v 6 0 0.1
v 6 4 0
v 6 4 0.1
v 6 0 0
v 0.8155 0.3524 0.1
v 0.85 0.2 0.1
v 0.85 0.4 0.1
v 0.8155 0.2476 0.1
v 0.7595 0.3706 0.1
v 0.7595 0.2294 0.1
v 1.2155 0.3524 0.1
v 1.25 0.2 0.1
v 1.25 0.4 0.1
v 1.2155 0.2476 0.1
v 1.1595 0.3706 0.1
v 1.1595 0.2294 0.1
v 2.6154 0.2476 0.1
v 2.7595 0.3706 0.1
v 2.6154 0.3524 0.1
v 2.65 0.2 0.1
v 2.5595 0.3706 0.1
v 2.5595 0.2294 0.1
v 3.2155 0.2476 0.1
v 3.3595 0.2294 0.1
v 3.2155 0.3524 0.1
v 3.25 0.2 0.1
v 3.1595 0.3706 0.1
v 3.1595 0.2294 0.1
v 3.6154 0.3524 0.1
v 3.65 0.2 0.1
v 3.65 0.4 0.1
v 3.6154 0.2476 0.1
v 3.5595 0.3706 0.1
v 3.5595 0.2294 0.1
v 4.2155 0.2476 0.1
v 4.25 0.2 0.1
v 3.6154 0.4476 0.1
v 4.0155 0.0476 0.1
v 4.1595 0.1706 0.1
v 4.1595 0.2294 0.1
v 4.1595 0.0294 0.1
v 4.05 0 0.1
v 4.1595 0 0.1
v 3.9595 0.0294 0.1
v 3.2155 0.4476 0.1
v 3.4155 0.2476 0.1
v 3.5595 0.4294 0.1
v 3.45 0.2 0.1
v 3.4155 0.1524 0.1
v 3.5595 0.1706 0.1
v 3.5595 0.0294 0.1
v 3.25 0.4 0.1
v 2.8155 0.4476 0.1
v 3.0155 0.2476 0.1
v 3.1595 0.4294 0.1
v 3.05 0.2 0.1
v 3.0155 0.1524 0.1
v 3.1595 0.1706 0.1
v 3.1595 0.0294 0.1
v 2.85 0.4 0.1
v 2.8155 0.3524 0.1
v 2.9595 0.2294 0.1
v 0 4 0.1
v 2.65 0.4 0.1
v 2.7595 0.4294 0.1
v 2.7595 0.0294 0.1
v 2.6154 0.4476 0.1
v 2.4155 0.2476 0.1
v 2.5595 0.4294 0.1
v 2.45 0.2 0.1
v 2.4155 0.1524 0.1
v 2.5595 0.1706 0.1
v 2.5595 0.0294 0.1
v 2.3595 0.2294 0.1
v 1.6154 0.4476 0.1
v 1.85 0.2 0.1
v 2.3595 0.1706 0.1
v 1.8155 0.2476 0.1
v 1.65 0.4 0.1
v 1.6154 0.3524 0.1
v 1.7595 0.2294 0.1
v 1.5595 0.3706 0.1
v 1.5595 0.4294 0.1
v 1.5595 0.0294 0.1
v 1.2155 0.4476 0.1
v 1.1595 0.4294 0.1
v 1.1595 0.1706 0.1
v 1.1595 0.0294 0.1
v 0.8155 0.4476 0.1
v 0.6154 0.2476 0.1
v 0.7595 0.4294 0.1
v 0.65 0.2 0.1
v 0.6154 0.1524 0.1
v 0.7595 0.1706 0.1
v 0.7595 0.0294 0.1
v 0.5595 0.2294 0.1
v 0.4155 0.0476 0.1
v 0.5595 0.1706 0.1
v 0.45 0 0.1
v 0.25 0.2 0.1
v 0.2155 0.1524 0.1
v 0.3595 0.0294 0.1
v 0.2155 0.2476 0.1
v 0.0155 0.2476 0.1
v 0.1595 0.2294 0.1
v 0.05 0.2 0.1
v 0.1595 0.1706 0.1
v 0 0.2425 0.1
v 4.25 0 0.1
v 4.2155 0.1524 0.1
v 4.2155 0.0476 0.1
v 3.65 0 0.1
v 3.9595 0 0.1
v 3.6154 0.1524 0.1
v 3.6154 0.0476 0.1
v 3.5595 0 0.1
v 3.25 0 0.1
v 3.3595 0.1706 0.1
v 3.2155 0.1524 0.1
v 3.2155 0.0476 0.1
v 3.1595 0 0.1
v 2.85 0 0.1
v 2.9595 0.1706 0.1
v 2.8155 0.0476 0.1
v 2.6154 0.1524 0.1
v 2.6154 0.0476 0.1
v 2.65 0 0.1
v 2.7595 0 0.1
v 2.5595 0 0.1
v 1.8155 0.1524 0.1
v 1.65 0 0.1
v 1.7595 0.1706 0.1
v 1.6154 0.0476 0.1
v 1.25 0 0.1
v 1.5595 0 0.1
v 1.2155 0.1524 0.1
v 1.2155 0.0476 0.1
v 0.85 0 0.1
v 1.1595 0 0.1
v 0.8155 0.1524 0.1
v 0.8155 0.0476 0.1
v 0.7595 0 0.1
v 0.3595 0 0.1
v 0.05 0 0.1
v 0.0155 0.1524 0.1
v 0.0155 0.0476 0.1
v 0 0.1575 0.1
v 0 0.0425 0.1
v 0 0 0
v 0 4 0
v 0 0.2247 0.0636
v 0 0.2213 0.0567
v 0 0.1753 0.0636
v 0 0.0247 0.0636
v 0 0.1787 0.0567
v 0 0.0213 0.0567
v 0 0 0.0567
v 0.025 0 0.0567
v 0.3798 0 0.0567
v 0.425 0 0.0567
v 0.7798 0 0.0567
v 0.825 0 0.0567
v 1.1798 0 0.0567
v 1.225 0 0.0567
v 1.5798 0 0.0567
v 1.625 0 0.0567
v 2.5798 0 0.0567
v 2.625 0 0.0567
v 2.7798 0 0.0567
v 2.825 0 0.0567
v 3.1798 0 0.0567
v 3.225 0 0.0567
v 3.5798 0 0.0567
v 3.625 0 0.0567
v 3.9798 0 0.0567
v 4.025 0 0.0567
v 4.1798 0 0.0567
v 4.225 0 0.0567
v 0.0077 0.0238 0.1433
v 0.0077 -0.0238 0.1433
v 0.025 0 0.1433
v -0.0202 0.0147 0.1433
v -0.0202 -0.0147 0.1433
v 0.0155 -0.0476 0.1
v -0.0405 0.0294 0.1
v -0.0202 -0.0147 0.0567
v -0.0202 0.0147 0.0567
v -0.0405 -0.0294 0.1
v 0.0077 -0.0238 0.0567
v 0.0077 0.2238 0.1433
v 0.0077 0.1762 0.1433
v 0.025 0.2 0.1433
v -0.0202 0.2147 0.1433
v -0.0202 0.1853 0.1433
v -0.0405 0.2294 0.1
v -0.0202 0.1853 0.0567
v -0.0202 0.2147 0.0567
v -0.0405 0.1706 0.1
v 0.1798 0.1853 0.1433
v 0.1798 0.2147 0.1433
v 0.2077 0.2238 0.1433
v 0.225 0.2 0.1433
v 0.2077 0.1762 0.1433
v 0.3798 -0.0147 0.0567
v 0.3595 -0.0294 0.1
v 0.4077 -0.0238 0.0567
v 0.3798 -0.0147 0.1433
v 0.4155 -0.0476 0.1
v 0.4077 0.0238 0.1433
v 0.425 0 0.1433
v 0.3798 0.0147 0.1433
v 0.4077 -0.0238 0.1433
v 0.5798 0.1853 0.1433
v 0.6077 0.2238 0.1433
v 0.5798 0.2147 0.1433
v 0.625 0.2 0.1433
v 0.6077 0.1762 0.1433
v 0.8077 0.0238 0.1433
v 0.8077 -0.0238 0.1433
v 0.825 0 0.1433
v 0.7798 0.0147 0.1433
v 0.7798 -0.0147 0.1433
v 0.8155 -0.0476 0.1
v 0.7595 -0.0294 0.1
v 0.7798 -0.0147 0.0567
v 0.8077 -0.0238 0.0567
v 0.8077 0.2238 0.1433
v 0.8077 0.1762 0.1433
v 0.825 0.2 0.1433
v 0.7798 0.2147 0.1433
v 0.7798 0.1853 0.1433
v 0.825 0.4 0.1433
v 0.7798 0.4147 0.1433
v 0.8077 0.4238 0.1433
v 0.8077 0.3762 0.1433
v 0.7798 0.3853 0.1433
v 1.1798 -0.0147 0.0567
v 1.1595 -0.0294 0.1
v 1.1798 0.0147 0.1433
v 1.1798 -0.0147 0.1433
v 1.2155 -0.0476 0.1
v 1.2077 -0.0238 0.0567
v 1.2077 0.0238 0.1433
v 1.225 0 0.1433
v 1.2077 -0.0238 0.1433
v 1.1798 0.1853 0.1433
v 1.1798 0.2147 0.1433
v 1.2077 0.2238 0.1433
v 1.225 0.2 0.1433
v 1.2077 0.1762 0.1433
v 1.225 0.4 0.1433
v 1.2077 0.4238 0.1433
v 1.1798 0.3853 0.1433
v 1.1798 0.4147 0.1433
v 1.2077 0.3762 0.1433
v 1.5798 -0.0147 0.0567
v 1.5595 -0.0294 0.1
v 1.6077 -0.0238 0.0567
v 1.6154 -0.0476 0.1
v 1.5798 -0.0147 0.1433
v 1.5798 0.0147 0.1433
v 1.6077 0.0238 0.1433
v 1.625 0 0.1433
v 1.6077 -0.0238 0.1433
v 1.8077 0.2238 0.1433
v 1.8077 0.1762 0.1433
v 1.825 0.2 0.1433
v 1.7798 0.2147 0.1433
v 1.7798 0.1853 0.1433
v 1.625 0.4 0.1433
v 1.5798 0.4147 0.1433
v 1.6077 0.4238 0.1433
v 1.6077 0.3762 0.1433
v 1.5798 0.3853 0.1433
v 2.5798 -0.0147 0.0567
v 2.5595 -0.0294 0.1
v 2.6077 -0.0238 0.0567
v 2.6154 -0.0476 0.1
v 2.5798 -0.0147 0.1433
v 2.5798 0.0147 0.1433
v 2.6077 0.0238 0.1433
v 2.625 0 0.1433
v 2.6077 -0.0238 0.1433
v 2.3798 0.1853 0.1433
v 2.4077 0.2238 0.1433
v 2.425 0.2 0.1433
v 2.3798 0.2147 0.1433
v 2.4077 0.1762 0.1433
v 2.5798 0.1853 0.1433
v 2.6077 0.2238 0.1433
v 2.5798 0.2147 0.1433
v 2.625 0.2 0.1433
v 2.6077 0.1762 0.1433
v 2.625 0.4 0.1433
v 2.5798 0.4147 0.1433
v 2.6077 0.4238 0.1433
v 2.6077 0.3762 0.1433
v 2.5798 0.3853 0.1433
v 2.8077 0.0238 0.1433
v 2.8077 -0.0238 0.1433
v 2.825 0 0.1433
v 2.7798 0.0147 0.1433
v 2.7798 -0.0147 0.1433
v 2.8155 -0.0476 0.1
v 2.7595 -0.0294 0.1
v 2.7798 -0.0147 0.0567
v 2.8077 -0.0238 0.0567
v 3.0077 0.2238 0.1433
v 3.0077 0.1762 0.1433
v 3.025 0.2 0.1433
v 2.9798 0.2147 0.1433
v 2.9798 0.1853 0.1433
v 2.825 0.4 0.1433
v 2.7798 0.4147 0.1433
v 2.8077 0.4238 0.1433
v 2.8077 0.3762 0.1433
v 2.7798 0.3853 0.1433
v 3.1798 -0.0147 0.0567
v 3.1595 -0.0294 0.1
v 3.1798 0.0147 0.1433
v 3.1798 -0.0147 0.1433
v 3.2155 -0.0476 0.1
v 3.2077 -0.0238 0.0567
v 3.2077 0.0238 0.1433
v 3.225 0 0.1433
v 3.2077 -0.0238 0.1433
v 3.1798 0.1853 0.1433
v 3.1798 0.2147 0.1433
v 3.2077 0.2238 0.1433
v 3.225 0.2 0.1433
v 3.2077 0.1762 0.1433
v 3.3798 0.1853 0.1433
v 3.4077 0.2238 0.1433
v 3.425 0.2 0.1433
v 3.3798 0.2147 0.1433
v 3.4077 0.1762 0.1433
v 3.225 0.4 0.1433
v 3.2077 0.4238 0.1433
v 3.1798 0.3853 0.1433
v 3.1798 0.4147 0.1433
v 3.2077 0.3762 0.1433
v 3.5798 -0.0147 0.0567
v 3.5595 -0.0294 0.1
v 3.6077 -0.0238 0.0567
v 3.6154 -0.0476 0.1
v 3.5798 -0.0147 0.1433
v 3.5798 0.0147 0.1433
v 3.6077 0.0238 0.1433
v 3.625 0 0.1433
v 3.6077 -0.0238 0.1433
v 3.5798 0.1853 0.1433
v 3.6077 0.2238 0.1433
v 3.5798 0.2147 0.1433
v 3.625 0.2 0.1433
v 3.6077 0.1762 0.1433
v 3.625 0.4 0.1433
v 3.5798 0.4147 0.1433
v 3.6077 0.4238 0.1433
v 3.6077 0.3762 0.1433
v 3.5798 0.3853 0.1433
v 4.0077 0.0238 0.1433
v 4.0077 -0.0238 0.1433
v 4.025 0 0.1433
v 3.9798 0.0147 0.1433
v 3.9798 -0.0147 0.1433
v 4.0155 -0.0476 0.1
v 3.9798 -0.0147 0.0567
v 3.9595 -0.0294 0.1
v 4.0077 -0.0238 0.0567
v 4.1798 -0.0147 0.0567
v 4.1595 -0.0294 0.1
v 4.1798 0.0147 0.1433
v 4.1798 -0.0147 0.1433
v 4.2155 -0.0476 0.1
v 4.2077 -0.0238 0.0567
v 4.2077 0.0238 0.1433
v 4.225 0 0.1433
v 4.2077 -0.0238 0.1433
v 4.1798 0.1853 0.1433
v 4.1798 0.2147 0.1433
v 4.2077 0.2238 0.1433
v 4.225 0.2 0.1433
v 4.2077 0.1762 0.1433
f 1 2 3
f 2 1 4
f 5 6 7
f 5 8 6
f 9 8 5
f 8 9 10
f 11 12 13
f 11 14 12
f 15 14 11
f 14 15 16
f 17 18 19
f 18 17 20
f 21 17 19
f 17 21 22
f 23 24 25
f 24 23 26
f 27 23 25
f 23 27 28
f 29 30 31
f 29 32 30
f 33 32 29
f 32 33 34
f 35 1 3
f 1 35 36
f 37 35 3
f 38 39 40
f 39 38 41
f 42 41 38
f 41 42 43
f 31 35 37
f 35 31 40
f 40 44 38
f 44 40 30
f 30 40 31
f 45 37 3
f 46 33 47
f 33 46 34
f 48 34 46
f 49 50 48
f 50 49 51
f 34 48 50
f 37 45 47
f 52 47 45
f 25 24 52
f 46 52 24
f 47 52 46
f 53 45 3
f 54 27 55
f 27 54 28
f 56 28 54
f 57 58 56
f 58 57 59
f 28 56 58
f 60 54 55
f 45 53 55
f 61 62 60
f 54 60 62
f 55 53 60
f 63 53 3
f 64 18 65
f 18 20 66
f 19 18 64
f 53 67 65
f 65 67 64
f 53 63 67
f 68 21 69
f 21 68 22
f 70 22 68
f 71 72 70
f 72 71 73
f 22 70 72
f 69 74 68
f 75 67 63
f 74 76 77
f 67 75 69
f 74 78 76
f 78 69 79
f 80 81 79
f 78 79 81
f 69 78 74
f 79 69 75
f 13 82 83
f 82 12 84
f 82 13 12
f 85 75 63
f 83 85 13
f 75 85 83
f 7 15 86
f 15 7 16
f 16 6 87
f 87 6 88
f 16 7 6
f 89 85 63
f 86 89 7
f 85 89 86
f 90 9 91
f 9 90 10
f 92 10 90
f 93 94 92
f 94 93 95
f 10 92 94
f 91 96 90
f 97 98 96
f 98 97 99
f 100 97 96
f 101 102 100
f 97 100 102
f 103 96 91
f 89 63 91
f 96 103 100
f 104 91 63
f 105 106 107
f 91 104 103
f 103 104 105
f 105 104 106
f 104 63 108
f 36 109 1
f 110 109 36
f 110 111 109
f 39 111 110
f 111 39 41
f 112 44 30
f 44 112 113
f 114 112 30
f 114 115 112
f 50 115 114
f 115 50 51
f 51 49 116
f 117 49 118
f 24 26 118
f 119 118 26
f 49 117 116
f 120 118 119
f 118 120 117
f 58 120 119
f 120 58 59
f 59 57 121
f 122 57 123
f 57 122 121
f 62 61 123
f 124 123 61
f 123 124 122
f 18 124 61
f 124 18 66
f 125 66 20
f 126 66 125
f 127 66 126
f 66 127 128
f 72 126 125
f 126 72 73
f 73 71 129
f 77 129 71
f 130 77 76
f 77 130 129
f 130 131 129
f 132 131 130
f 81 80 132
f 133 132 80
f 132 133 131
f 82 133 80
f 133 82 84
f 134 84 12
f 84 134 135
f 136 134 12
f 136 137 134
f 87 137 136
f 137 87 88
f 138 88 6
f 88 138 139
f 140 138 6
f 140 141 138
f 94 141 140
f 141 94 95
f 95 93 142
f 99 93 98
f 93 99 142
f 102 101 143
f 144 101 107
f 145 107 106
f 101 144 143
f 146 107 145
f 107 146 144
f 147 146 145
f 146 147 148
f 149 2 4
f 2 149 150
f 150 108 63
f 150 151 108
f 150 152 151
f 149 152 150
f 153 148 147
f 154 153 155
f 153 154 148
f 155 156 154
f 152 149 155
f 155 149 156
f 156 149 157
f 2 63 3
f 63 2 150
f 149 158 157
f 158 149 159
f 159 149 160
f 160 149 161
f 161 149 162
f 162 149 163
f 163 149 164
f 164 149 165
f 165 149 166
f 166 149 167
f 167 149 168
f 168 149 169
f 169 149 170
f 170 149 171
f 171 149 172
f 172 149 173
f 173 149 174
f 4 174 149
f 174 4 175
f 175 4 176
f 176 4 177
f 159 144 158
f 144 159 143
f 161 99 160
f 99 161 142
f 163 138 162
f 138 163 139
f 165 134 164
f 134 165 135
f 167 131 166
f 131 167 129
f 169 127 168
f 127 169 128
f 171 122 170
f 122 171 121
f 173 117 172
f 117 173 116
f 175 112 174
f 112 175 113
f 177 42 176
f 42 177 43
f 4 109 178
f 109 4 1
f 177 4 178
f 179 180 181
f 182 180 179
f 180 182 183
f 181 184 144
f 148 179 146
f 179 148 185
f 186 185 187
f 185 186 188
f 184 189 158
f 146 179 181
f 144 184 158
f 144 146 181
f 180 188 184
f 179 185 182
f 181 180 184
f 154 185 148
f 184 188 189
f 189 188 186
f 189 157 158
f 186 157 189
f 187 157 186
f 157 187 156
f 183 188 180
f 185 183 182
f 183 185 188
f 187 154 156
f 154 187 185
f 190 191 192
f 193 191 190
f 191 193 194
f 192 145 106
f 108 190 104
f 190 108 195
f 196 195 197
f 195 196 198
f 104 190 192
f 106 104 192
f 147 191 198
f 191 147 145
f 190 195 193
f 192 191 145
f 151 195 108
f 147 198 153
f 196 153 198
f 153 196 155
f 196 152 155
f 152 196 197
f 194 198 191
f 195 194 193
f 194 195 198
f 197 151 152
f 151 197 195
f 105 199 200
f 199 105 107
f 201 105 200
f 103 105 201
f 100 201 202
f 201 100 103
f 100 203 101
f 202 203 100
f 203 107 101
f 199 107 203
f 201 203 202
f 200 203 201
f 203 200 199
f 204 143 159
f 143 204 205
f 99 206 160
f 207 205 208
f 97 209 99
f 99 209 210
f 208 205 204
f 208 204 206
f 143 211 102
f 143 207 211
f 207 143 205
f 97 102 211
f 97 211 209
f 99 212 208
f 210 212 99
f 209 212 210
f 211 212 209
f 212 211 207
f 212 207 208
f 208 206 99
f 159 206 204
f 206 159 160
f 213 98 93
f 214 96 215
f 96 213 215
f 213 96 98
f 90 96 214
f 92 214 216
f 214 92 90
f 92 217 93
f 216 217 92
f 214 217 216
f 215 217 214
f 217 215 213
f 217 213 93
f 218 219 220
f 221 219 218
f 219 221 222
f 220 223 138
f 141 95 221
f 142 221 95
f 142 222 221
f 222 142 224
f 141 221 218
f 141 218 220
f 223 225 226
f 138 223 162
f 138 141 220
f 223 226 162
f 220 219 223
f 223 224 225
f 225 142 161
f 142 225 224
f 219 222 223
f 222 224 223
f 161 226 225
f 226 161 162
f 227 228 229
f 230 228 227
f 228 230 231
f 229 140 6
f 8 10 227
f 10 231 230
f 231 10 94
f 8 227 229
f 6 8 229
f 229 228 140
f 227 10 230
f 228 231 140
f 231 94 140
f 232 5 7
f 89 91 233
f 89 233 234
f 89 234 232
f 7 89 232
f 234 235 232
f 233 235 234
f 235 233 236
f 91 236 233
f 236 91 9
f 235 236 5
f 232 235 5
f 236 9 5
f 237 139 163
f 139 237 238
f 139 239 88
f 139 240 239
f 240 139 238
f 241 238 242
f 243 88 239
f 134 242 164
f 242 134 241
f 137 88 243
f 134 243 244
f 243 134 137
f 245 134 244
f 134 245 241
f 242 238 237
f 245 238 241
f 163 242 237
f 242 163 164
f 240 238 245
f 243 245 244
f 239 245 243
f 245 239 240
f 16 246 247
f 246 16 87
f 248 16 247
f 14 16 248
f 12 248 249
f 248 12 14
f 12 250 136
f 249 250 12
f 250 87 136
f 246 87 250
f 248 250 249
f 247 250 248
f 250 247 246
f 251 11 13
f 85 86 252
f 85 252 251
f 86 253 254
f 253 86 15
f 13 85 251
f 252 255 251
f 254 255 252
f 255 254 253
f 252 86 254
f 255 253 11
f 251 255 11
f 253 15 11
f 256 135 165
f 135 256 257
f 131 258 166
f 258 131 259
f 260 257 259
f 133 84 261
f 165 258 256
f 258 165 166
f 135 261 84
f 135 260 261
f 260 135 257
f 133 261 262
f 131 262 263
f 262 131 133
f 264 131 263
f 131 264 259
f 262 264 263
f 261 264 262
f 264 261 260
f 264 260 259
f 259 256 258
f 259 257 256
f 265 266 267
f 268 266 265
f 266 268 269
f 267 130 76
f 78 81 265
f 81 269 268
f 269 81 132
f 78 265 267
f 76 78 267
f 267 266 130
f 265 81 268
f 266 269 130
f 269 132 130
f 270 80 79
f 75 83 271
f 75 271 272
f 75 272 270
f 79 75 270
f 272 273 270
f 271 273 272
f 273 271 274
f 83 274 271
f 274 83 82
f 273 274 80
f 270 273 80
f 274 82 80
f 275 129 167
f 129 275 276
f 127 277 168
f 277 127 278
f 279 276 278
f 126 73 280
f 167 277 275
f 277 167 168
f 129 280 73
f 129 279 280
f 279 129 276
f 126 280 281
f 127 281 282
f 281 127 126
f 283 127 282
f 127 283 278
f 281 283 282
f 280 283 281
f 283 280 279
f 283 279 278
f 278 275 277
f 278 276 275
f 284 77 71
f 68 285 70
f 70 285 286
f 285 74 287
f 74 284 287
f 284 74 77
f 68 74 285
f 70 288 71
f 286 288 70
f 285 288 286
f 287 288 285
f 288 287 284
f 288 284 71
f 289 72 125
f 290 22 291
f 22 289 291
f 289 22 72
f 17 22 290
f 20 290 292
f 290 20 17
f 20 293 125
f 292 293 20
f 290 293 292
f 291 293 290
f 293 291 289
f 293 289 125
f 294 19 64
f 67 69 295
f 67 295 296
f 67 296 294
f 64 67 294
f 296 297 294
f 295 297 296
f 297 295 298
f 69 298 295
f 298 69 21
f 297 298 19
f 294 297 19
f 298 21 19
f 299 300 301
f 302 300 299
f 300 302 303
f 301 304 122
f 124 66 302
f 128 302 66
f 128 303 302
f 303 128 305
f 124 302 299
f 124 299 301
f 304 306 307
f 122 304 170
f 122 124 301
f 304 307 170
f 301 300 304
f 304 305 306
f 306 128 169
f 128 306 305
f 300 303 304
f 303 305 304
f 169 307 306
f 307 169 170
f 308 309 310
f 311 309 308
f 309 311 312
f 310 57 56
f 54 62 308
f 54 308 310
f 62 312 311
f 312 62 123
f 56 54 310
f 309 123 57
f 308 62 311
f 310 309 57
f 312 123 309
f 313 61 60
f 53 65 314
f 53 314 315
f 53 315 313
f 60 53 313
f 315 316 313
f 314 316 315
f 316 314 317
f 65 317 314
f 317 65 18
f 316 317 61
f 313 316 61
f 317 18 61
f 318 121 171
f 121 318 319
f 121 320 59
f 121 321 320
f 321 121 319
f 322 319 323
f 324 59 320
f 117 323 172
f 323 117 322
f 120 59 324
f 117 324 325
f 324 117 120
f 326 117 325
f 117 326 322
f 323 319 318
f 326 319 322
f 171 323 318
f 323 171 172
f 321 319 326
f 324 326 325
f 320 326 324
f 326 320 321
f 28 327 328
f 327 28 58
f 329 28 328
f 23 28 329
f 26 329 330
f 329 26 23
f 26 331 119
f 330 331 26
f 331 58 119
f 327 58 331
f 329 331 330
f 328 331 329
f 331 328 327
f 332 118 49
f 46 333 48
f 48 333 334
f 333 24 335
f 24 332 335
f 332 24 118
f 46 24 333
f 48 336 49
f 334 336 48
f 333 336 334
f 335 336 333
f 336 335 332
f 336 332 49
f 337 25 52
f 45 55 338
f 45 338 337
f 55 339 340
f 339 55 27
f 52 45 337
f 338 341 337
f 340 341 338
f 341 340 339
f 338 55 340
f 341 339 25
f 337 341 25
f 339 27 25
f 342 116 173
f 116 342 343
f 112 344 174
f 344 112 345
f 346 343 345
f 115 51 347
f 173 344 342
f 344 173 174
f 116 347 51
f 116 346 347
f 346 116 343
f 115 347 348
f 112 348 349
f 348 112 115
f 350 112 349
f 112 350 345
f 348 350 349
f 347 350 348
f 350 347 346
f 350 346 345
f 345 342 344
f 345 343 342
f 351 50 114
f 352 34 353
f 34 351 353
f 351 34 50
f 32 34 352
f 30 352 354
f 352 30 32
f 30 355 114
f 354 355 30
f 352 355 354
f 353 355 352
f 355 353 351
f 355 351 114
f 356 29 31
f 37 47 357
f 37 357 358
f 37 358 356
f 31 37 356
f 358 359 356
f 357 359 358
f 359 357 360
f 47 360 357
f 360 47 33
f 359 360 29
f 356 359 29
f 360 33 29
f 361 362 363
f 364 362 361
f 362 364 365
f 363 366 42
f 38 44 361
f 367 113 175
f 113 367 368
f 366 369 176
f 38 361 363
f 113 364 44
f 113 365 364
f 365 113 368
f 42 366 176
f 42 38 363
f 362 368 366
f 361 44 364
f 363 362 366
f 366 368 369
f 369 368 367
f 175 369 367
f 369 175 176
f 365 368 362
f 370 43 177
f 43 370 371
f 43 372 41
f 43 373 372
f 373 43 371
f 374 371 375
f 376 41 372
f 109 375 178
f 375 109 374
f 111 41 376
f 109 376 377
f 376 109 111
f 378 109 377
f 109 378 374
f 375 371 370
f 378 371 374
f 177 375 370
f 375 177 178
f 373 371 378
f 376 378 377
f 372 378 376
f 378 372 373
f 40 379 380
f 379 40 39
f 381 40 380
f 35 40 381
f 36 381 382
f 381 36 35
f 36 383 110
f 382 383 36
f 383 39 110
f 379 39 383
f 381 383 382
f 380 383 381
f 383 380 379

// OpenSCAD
// Generated by SolidPython 1.1.3 on 2024-07-14 00:51:49


union() {
	cube(size = [6.0000000000, 4.0000000000, 0.1000000000]);
	translate(v = [0.0000000000, 0.0000000000, 0.1000000000]) {
		sphere(r = 0.0500000000);
	}
	translate(v = [0.0000000000, 0.2000000000, 0.1000000000]) {
		sphere(r = 0.0500000000);
	}
	translate(v = [0.2000000000, 0.2000000000, 0.1000000000]) {
		sphere(r = 0.0500000000);
	}
	translate(v = [0.4000000000, 0.0000000000, 0.1000000000]) {
		sphere(r = 0.0500000000);
	}
	translate(v = [0.6000000000, 0.2000000000, 0.1000000000]) {
		sphere(r = 0.0500000000);
	}
	translate(v = [0.8000000000, 0.0000000000, 0.1000000000]) {
		sphere(r = 0.0500000000);
	}
	translate(v = [0.8000000000, 0.2000000000, 0.1000000000]) {
		sphere(r = 0.0500000000);
	}
	translate(v = [0.8000000000, 0.4000000000, 0.1000000000]) {
		sphere(r = 0.0500000000);
	}
	translate(v = [1.2000000000, 0.0000000000, 0.1000000000]) {
		sphere(r = 0.0500000000);
	}
	translate(v = [1.2000000000, 0.2000000000, 0.1000000000]) {
		sphere(r = 0.0500000000);
	}
	translate(v = [1.2000000000, 0.4000000000, 0.1000000000]) {
		sphere(r = 0.0500000000);
	}
	translate(v = [1.6000000000, 0.0000000000, 0.1000000000]) {
		sphere(r = 0.0500000000);
	}
	translate(v = [1.8000000000, 0.2000000000, 0.1000000000]) {
		sphere(r = 0.0500000000);
	}
	translate(v = [1.6000000000, 0.4000000000, 0.1000000000]) {
		sphere(r = 0.0500000000);
	}
	translate(v = [2.6000000000, 0.0000000000, 0.1000000000]) {
		sphere(r = 0.0500000000);
	}
	translate(v = [2.4000000000, 0.2000000000, 0.1000000000]) {
		sphere(r = 0.0500000000);
	}
	translate(v = [2.6000000000, 0.2000000000, 0.1000000000]) {
		sphere(r = 0.0500000000);
	}
	translate(v = [2.6000000000, 0.4000000000, 0.1000000000]) {
		sphere(r = 0.0500000000);
	}
	translate(v = [2.8000000000, 0.0000000000, 0.1000000000]) {
		sphere(r = 0.0500000000);
	}
	translate(v = [3.0000000000, 0.2000000000, 0.1000000000]) {
		sphere(r = 0.0500000000);
	}
	translate(v = [2.8000000000, 0.4000000000, 0.1000000000]) {
		sphere(r = 0.0500000000);
	}
	translate(v = [3.2000000000, 0.0000000000, 0.1000000000]) {
		sphere(r = 0.0500000000);
	}
	translate(v = [3.2000000000, 0.2000000000, 0.1000000000]) {
		sphere(r = 0.0500000000);
	}
	translate(v = [3.4000000000, 0.2000000000, 0.1000000000]) {
		sphere(r = 0.0500000000);
	}
	translate(v = [3.2000000000, 0.4000000000, 0.1000000000]) {
		sphere(r = 0.0500000000);
	}
	translate(v = [3.6000000000, 0.0000000000, 0.1000000000]) {
		sphere(r = 0.0500000000);
	}
	translate(v = [3.6000000000, 0.2000000000, 0.1000000000]) {
		sphere(r = 0.0500000000);
	}
	translate(v = [3.6000000000, 0.4000000000, 0.1000000000]) {
		sphere(r = 0.0500000000);
	}
	translate(v = [4.0000000000, 0.0000000000, 0.1000000000]) {
		sphere(r = 0.0500000000);
	}
	translate(v = [4.2000000000, 0.0000000000, 0.1000000000]) {
		sphere(r = 0.0500000000);
	}
	translate(v = [4.2000000000, 0.2000000000, 0.1000000000]) {
		sphere(r = 0.0500000000);
	}
}
/***********************************************
*********      SolidPython code:      **********
************************************************
 
import numpy as np
from solid import *
from solid.utils import *

# Braille dictionary (complete for demonstration)
braille_dict = {
    'a': '100000', 'b': '101000', 'c': '110000', 'd': '110100', 'e': '100100',
    'f': '111000', 'g': '111100', 'h': '101100', 'i': '011000', 'j': '011100',
    'k': '100010', 'l': '101010', 'm': '110010', 'n': '110110', 'o': '100110',
    'p': '111010', 'q': '111110', 'r': '101110', 's': '011010', 't': '011110',
    'u': '100011', 'v': '101011', 'w': '011101', 'x': '110011', 'y': '110111',
    'z': '100111', ' ': '000000'
}

def text_to_braille(text):
    return [braille_dict.get(char, '000000') for char in text.lower()]

def generate_braille_stl(text, filename):
    braille_text = text_to_braille(text)
    unit_height = 0.1  # height of the Braille dots
    unit_radius = 0.05  # radius of the Braille dots
    dot_spacing = 0.2  # spacing between Braille dots
    line_spacing = 0.3  # spacing between lines of Braille
    char_spacing = 0.4  # spacing between Braille characters

    postcard_length = 6.0
    postcard_width = 4.0
    postcard_height = 0.1

    braille_group = []
    x_offset = 0
    y_offset = 0

    for braille_char in braille_text:
        dots = [(x_offset + dot_spacing * (i % 2),
                 y_offset + dot_spacing * (i // 2),
                 unit_height if braille_char[i] == '1' else 0)
                for i in range(6)]
        for dot in dots:
            if dot[2] > 0:
                translated_sphere = translate(dot)(sphere(r=unit_radius))
                braille_group.append(translated_sphere)
                # Debugging: Print coordinates and object info
                print(f"Adding dot at {dot}: {translated_sphere}")
        x_offset += char_spacing
        if x_offset >= postcard_length - char_spacing:
            x_offset = 0
            y_offset += line_spacing

    postcard = cube([postcard_length, postcard_width, postcard_height])
    braille_model = union()(postcard, *braille_group)
    
    # Generate and save SCAD file for visualization
    scad_filename = filename.replace('.stl', '.scad')
    scad_render_to_file(braille_model, scad_filename)
    
    # Generate and save STL file
    with open(filename, 'w') as f:
        f.write(scad_render_to_file(braille_model))

# Example usage
text = "Hello World"
filename = "braille_postcard.stl"
generate_braille_stl(text, filename)
 
 
************************************************/
